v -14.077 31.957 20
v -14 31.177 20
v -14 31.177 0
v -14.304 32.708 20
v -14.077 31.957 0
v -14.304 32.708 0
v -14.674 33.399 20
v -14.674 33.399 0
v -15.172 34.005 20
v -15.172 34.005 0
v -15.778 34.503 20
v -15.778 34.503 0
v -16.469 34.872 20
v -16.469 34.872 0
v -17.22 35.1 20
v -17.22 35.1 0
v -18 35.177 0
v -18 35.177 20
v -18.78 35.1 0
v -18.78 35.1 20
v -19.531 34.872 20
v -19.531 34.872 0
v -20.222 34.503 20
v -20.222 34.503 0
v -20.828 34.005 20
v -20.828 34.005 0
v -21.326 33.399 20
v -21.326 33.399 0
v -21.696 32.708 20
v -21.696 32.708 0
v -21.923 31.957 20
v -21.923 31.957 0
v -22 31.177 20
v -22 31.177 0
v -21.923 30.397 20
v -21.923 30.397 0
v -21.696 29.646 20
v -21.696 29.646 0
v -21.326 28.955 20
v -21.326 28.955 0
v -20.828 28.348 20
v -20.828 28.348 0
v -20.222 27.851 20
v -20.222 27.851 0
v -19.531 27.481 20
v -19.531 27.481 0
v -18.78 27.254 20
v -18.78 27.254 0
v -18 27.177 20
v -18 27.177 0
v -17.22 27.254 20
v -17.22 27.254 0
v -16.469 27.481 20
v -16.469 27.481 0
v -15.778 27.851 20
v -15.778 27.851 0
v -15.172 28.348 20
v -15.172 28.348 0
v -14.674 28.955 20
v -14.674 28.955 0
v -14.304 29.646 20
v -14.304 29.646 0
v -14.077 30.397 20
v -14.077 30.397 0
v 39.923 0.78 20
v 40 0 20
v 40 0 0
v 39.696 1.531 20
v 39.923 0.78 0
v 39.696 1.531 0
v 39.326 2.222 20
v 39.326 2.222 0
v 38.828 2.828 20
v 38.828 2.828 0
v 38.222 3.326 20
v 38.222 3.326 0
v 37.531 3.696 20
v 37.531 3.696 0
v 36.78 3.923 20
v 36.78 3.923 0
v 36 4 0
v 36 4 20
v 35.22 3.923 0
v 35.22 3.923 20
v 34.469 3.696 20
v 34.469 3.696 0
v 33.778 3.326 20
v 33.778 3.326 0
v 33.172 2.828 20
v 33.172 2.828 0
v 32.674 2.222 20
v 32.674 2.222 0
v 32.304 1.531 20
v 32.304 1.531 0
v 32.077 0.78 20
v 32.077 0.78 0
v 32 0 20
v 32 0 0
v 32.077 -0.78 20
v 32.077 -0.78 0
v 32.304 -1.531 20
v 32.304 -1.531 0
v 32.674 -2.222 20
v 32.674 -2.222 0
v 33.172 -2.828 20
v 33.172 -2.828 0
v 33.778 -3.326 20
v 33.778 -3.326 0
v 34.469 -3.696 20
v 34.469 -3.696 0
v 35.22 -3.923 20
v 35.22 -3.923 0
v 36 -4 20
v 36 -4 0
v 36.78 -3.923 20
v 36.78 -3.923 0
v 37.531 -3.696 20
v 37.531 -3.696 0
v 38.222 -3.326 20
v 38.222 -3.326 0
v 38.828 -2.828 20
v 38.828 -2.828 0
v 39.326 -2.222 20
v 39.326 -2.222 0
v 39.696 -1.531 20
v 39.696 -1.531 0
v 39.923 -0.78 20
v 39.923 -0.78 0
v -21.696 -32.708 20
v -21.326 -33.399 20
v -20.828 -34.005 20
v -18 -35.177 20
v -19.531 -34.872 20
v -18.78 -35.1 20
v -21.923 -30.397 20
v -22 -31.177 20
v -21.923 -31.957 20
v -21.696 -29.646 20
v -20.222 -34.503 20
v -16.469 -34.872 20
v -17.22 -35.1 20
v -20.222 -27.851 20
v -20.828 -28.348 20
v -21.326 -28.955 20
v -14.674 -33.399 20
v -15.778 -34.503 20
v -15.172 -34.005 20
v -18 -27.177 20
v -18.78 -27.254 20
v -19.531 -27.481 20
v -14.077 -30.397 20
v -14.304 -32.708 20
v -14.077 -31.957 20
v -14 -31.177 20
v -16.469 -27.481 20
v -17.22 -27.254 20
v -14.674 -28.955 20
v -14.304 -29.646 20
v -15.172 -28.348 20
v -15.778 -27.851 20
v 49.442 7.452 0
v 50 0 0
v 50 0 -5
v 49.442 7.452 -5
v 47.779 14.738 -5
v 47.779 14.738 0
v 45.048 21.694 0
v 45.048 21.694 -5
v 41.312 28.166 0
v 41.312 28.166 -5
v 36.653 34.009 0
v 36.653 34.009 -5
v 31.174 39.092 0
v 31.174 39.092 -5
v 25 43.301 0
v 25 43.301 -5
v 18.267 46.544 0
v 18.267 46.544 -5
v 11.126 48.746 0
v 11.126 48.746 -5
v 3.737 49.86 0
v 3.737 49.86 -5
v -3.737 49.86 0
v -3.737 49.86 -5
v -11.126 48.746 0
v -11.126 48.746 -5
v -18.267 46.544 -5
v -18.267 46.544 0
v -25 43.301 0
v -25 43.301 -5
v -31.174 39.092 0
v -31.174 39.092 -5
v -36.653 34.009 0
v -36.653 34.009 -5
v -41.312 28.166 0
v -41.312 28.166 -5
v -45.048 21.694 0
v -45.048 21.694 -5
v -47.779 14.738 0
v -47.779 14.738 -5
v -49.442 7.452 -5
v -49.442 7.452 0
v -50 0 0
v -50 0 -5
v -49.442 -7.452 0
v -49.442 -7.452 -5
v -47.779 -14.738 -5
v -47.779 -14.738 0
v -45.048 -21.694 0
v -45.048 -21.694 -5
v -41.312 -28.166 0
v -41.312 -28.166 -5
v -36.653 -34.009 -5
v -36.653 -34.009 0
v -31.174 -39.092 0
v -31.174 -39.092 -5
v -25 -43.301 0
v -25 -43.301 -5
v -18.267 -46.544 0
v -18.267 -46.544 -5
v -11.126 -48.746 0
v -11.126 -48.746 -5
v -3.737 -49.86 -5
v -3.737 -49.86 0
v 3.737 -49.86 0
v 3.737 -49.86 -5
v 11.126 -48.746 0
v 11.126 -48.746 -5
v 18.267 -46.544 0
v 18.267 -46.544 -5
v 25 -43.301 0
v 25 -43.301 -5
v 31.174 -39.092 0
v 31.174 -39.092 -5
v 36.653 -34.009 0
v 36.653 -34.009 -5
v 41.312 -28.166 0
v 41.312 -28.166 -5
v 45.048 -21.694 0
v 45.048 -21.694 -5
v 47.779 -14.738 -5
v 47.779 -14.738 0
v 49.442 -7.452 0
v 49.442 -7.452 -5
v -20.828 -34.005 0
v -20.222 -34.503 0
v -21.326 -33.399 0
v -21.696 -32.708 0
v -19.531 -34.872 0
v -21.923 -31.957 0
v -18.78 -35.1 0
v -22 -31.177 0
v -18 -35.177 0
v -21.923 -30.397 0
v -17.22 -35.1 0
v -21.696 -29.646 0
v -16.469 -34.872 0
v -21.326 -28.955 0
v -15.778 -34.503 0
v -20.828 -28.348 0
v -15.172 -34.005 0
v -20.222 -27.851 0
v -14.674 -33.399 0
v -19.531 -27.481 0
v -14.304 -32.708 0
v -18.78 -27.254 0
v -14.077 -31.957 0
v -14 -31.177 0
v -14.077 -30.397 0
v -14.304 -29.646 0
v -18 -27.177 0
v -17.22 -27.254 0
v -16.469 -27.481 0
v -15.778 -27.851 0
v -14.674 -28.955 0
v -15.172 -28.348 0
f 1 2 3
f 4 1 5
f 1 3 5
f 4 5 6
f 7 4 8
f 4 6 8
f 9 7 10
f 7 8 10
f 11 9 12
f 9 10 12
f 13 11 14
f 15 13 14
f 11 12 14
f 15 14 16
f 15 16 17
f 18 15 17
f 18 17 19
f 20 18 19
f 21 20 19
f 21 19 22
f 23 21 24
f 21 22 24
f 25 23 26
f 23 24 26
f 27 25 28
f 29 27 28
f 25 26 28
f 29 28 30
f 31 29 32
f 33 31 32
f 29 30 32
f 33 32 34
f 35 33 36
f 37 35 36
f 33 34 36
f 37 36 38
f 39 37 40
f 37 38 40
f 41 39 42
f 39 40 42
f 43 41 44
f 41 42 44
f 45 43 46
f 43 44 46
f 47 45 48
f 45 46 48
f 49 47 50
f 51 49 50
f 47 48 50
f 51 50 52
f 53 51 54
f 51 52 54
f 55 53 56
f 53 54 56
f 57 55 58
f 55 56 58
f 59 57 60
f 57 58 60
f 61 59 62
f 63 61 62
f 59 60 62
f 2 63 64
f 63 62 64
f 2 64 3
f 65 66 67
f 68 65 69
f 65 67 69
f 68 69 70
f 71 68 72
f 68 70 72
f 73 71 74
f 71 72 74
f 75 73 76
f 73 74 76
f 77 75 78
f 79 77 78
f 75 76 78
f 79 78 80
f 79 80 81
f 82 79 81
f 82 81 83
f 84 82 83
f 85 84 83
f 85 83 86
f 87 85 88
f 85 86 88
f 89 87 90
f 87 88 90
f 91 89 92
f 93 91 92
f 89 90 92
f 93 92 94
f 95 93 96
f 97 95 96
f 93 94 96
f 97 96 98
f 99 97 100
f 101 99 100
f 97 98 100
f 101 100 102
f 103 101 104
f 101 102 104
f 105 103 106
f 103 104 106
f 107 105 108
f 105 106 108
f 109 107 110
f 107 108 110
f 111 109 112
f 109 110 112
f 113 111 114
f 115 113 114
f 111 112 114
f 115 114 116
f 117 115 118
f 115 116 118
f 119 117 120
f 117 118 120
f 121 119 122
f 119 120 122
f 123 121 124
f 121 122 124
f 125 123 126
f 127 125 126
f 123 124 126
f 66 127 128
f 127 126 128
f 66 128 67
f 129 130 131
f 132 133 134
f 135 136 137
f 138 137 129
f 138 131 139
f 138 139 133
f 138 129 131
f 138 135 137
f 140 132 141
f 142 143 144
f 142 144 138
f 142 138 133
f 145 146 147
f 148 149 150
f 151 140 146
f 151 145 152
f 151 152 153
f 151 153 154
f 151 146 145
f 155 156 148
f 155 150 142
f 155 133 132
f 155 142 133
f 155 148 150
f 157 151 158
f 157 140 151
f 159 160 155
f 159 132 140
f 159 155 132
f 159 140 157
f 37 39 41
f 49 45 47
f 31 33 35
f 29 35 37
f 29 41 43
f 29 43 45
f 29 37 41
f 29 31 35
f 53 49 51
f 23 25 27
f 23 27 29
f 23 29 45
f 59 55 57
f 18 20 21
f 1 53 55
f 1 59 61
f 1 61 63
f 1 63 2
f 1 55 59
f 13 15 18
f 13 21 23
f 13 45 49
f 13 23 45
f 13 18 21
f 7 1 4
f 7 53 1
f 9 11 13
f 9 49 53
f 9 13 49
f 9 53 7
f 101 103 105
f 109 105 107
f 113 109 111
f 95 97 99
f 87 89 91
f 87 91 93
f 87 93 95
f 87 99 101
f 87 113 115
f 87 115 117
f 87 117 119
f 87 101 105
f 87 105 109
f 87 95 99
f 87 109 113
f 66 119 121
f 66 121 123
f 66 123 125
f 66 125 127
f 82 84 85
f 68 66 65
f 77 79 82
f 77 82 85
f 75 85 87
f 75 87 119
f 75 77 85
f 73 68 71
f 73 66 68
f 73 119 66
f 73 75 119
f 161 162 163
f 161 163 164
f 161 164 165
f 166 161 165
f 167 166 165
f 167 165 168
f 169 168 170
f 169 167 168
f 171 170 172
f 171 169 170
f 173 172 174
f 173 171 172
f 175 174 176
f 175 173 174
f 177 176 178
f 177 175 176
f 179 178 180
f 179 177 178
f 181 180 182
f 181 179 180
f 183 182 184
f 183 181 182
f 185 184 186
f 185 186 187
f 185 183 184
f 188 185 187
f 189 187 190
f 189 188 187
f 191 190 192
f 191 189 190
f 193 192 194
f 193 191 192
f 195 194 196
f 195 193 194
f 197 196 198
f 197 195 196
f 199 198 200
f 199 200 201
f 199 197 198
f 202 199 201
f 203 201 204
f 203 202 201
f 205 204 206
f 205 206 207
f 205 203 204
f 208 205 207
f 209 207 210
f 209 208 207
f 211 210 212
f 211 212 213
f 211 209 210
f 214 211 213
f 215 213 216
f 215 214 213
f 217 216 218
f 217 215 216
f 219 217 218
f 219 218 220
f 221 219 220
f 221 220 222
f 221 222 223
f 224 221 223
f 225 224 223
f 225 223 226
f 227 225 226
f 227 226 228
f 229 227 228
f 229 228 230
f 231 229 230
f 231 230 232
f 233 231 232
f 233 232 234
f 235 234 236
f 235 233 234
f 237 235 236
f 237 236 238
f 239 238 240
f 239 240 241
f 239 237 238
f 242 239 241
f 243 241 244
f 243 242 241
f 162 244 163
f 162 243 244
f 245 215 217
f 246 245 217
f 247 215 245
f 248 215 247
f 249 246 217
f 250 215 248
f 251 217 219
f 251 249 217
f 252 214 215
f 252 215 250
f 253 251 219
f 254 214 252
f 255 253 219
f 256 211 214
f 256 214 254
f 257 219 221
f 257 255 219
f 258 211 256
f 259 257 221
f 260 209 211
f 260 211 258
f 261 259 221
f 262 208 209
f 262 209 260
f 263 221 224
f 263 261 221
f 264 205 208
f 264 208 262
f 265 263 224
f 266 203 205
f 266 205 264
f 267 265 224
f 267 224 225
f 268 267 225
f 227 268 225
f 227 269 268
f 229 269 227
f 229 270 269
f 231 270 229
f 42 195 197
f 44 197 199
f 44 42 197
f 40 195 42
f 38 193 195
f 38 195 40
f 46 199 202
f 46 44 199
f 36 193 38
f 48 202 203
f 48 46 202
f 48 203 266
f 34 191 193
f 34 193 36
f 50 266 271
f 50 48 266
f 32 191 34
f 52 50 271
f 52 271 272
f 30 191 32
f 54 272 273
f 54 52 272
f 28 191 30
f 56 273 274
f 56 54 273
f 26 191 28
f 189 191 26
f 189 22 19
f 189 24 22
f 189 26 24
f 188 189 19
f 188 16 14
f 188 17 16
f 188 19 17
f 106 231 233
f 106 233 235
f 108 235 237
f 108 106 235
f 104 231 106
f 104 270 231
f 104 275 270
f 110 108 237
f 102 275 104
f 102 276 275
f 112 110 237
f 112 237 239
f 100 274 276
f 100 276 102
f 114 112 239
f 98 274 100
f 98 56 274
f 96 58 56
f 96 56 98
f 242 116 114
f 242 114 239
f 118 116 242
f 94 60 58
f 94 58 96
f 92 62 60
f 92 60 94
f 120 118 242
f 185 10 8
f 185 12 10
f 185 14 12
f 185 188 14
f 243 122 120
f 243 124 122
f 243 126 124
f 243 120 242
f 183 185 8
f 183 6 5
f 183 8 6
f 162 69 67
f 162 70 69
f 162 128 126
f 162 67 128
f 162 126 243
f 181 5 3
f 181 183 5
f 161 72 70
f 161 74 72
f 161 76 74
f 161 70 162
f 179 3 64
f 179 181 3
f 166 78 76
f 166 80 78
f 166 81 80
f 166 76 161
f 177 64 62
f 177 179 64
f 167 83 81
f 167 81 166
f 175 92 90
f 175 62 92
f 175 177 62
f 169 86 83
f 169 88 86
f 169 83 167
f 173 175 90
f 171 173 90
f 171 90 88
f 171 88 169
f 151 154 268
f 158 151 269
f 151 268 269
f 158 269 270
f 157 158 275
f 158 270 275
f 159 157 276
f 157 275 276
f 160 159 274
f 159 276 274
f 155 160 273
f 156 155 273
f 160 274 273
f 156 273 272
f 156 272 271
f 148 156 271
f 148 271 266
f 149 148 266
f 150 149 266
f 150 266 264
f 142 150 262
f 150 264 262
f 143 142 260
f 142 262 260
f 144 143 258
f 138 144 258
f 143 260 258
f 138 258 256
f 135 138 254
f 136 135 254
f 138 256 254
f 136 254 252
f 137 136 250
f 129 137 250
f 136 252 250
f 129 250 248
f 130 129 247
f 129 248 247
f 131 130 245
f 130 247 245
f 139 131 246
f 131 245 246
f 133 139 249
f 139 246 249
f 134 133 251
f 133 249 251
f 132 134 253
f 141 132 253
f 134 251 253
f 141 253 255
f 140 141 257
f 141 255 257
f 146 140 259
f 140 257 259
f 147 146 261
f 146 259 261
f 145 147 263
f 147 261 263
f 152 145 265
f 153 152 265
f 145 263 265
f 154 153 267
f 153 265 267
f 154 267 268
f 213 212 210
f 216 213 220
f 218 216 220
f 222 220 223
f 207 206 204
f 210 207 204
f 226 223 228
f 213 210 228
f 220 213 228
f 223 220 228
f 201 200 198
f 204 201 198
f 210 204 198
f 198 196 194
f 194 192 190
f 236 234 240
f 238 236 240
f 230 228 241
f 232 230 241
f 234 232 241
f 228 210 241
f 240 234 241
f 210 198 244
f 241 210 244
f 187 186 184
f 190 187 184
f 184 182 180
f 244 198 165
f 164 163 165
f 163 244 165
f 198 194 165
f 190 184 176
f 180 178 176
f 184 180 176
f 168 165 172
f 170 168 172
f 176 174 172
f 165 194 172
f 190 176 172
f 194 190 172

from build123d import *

# Parameters (mm, degrees)
SKETCH1_R           = 50
BOSS_EXTRUDE1_DEPTH = 5
SKETCH2_R           = 4
BOSS_EXTRUDE2_DEPTH = 20


with BuildPart() as part:
    # Sketch1 → Boss-Extrude1 (new body)
    with BuildSketch(Plane.XY):
        Circle(SKETCH1_R)
    extrude(amount=-BOSS_EXTRUDE1_DEPTH)

    # Sketch2 → Boss-Extrude2 (add)
    with BuildSketch(Plane.XY):
        with Locations((36, 0)):
            Circle(SKETCH2_R)
        with Locations((-18, 31.176914536)):
            Circle(SKETCH2_R)
        with Locations((-18, -31.176914536)):
            Circle(SKETCH2_R)
    extrude(amount=BOSS_EXTRUDE2_DEPTH)


solid = part.part
